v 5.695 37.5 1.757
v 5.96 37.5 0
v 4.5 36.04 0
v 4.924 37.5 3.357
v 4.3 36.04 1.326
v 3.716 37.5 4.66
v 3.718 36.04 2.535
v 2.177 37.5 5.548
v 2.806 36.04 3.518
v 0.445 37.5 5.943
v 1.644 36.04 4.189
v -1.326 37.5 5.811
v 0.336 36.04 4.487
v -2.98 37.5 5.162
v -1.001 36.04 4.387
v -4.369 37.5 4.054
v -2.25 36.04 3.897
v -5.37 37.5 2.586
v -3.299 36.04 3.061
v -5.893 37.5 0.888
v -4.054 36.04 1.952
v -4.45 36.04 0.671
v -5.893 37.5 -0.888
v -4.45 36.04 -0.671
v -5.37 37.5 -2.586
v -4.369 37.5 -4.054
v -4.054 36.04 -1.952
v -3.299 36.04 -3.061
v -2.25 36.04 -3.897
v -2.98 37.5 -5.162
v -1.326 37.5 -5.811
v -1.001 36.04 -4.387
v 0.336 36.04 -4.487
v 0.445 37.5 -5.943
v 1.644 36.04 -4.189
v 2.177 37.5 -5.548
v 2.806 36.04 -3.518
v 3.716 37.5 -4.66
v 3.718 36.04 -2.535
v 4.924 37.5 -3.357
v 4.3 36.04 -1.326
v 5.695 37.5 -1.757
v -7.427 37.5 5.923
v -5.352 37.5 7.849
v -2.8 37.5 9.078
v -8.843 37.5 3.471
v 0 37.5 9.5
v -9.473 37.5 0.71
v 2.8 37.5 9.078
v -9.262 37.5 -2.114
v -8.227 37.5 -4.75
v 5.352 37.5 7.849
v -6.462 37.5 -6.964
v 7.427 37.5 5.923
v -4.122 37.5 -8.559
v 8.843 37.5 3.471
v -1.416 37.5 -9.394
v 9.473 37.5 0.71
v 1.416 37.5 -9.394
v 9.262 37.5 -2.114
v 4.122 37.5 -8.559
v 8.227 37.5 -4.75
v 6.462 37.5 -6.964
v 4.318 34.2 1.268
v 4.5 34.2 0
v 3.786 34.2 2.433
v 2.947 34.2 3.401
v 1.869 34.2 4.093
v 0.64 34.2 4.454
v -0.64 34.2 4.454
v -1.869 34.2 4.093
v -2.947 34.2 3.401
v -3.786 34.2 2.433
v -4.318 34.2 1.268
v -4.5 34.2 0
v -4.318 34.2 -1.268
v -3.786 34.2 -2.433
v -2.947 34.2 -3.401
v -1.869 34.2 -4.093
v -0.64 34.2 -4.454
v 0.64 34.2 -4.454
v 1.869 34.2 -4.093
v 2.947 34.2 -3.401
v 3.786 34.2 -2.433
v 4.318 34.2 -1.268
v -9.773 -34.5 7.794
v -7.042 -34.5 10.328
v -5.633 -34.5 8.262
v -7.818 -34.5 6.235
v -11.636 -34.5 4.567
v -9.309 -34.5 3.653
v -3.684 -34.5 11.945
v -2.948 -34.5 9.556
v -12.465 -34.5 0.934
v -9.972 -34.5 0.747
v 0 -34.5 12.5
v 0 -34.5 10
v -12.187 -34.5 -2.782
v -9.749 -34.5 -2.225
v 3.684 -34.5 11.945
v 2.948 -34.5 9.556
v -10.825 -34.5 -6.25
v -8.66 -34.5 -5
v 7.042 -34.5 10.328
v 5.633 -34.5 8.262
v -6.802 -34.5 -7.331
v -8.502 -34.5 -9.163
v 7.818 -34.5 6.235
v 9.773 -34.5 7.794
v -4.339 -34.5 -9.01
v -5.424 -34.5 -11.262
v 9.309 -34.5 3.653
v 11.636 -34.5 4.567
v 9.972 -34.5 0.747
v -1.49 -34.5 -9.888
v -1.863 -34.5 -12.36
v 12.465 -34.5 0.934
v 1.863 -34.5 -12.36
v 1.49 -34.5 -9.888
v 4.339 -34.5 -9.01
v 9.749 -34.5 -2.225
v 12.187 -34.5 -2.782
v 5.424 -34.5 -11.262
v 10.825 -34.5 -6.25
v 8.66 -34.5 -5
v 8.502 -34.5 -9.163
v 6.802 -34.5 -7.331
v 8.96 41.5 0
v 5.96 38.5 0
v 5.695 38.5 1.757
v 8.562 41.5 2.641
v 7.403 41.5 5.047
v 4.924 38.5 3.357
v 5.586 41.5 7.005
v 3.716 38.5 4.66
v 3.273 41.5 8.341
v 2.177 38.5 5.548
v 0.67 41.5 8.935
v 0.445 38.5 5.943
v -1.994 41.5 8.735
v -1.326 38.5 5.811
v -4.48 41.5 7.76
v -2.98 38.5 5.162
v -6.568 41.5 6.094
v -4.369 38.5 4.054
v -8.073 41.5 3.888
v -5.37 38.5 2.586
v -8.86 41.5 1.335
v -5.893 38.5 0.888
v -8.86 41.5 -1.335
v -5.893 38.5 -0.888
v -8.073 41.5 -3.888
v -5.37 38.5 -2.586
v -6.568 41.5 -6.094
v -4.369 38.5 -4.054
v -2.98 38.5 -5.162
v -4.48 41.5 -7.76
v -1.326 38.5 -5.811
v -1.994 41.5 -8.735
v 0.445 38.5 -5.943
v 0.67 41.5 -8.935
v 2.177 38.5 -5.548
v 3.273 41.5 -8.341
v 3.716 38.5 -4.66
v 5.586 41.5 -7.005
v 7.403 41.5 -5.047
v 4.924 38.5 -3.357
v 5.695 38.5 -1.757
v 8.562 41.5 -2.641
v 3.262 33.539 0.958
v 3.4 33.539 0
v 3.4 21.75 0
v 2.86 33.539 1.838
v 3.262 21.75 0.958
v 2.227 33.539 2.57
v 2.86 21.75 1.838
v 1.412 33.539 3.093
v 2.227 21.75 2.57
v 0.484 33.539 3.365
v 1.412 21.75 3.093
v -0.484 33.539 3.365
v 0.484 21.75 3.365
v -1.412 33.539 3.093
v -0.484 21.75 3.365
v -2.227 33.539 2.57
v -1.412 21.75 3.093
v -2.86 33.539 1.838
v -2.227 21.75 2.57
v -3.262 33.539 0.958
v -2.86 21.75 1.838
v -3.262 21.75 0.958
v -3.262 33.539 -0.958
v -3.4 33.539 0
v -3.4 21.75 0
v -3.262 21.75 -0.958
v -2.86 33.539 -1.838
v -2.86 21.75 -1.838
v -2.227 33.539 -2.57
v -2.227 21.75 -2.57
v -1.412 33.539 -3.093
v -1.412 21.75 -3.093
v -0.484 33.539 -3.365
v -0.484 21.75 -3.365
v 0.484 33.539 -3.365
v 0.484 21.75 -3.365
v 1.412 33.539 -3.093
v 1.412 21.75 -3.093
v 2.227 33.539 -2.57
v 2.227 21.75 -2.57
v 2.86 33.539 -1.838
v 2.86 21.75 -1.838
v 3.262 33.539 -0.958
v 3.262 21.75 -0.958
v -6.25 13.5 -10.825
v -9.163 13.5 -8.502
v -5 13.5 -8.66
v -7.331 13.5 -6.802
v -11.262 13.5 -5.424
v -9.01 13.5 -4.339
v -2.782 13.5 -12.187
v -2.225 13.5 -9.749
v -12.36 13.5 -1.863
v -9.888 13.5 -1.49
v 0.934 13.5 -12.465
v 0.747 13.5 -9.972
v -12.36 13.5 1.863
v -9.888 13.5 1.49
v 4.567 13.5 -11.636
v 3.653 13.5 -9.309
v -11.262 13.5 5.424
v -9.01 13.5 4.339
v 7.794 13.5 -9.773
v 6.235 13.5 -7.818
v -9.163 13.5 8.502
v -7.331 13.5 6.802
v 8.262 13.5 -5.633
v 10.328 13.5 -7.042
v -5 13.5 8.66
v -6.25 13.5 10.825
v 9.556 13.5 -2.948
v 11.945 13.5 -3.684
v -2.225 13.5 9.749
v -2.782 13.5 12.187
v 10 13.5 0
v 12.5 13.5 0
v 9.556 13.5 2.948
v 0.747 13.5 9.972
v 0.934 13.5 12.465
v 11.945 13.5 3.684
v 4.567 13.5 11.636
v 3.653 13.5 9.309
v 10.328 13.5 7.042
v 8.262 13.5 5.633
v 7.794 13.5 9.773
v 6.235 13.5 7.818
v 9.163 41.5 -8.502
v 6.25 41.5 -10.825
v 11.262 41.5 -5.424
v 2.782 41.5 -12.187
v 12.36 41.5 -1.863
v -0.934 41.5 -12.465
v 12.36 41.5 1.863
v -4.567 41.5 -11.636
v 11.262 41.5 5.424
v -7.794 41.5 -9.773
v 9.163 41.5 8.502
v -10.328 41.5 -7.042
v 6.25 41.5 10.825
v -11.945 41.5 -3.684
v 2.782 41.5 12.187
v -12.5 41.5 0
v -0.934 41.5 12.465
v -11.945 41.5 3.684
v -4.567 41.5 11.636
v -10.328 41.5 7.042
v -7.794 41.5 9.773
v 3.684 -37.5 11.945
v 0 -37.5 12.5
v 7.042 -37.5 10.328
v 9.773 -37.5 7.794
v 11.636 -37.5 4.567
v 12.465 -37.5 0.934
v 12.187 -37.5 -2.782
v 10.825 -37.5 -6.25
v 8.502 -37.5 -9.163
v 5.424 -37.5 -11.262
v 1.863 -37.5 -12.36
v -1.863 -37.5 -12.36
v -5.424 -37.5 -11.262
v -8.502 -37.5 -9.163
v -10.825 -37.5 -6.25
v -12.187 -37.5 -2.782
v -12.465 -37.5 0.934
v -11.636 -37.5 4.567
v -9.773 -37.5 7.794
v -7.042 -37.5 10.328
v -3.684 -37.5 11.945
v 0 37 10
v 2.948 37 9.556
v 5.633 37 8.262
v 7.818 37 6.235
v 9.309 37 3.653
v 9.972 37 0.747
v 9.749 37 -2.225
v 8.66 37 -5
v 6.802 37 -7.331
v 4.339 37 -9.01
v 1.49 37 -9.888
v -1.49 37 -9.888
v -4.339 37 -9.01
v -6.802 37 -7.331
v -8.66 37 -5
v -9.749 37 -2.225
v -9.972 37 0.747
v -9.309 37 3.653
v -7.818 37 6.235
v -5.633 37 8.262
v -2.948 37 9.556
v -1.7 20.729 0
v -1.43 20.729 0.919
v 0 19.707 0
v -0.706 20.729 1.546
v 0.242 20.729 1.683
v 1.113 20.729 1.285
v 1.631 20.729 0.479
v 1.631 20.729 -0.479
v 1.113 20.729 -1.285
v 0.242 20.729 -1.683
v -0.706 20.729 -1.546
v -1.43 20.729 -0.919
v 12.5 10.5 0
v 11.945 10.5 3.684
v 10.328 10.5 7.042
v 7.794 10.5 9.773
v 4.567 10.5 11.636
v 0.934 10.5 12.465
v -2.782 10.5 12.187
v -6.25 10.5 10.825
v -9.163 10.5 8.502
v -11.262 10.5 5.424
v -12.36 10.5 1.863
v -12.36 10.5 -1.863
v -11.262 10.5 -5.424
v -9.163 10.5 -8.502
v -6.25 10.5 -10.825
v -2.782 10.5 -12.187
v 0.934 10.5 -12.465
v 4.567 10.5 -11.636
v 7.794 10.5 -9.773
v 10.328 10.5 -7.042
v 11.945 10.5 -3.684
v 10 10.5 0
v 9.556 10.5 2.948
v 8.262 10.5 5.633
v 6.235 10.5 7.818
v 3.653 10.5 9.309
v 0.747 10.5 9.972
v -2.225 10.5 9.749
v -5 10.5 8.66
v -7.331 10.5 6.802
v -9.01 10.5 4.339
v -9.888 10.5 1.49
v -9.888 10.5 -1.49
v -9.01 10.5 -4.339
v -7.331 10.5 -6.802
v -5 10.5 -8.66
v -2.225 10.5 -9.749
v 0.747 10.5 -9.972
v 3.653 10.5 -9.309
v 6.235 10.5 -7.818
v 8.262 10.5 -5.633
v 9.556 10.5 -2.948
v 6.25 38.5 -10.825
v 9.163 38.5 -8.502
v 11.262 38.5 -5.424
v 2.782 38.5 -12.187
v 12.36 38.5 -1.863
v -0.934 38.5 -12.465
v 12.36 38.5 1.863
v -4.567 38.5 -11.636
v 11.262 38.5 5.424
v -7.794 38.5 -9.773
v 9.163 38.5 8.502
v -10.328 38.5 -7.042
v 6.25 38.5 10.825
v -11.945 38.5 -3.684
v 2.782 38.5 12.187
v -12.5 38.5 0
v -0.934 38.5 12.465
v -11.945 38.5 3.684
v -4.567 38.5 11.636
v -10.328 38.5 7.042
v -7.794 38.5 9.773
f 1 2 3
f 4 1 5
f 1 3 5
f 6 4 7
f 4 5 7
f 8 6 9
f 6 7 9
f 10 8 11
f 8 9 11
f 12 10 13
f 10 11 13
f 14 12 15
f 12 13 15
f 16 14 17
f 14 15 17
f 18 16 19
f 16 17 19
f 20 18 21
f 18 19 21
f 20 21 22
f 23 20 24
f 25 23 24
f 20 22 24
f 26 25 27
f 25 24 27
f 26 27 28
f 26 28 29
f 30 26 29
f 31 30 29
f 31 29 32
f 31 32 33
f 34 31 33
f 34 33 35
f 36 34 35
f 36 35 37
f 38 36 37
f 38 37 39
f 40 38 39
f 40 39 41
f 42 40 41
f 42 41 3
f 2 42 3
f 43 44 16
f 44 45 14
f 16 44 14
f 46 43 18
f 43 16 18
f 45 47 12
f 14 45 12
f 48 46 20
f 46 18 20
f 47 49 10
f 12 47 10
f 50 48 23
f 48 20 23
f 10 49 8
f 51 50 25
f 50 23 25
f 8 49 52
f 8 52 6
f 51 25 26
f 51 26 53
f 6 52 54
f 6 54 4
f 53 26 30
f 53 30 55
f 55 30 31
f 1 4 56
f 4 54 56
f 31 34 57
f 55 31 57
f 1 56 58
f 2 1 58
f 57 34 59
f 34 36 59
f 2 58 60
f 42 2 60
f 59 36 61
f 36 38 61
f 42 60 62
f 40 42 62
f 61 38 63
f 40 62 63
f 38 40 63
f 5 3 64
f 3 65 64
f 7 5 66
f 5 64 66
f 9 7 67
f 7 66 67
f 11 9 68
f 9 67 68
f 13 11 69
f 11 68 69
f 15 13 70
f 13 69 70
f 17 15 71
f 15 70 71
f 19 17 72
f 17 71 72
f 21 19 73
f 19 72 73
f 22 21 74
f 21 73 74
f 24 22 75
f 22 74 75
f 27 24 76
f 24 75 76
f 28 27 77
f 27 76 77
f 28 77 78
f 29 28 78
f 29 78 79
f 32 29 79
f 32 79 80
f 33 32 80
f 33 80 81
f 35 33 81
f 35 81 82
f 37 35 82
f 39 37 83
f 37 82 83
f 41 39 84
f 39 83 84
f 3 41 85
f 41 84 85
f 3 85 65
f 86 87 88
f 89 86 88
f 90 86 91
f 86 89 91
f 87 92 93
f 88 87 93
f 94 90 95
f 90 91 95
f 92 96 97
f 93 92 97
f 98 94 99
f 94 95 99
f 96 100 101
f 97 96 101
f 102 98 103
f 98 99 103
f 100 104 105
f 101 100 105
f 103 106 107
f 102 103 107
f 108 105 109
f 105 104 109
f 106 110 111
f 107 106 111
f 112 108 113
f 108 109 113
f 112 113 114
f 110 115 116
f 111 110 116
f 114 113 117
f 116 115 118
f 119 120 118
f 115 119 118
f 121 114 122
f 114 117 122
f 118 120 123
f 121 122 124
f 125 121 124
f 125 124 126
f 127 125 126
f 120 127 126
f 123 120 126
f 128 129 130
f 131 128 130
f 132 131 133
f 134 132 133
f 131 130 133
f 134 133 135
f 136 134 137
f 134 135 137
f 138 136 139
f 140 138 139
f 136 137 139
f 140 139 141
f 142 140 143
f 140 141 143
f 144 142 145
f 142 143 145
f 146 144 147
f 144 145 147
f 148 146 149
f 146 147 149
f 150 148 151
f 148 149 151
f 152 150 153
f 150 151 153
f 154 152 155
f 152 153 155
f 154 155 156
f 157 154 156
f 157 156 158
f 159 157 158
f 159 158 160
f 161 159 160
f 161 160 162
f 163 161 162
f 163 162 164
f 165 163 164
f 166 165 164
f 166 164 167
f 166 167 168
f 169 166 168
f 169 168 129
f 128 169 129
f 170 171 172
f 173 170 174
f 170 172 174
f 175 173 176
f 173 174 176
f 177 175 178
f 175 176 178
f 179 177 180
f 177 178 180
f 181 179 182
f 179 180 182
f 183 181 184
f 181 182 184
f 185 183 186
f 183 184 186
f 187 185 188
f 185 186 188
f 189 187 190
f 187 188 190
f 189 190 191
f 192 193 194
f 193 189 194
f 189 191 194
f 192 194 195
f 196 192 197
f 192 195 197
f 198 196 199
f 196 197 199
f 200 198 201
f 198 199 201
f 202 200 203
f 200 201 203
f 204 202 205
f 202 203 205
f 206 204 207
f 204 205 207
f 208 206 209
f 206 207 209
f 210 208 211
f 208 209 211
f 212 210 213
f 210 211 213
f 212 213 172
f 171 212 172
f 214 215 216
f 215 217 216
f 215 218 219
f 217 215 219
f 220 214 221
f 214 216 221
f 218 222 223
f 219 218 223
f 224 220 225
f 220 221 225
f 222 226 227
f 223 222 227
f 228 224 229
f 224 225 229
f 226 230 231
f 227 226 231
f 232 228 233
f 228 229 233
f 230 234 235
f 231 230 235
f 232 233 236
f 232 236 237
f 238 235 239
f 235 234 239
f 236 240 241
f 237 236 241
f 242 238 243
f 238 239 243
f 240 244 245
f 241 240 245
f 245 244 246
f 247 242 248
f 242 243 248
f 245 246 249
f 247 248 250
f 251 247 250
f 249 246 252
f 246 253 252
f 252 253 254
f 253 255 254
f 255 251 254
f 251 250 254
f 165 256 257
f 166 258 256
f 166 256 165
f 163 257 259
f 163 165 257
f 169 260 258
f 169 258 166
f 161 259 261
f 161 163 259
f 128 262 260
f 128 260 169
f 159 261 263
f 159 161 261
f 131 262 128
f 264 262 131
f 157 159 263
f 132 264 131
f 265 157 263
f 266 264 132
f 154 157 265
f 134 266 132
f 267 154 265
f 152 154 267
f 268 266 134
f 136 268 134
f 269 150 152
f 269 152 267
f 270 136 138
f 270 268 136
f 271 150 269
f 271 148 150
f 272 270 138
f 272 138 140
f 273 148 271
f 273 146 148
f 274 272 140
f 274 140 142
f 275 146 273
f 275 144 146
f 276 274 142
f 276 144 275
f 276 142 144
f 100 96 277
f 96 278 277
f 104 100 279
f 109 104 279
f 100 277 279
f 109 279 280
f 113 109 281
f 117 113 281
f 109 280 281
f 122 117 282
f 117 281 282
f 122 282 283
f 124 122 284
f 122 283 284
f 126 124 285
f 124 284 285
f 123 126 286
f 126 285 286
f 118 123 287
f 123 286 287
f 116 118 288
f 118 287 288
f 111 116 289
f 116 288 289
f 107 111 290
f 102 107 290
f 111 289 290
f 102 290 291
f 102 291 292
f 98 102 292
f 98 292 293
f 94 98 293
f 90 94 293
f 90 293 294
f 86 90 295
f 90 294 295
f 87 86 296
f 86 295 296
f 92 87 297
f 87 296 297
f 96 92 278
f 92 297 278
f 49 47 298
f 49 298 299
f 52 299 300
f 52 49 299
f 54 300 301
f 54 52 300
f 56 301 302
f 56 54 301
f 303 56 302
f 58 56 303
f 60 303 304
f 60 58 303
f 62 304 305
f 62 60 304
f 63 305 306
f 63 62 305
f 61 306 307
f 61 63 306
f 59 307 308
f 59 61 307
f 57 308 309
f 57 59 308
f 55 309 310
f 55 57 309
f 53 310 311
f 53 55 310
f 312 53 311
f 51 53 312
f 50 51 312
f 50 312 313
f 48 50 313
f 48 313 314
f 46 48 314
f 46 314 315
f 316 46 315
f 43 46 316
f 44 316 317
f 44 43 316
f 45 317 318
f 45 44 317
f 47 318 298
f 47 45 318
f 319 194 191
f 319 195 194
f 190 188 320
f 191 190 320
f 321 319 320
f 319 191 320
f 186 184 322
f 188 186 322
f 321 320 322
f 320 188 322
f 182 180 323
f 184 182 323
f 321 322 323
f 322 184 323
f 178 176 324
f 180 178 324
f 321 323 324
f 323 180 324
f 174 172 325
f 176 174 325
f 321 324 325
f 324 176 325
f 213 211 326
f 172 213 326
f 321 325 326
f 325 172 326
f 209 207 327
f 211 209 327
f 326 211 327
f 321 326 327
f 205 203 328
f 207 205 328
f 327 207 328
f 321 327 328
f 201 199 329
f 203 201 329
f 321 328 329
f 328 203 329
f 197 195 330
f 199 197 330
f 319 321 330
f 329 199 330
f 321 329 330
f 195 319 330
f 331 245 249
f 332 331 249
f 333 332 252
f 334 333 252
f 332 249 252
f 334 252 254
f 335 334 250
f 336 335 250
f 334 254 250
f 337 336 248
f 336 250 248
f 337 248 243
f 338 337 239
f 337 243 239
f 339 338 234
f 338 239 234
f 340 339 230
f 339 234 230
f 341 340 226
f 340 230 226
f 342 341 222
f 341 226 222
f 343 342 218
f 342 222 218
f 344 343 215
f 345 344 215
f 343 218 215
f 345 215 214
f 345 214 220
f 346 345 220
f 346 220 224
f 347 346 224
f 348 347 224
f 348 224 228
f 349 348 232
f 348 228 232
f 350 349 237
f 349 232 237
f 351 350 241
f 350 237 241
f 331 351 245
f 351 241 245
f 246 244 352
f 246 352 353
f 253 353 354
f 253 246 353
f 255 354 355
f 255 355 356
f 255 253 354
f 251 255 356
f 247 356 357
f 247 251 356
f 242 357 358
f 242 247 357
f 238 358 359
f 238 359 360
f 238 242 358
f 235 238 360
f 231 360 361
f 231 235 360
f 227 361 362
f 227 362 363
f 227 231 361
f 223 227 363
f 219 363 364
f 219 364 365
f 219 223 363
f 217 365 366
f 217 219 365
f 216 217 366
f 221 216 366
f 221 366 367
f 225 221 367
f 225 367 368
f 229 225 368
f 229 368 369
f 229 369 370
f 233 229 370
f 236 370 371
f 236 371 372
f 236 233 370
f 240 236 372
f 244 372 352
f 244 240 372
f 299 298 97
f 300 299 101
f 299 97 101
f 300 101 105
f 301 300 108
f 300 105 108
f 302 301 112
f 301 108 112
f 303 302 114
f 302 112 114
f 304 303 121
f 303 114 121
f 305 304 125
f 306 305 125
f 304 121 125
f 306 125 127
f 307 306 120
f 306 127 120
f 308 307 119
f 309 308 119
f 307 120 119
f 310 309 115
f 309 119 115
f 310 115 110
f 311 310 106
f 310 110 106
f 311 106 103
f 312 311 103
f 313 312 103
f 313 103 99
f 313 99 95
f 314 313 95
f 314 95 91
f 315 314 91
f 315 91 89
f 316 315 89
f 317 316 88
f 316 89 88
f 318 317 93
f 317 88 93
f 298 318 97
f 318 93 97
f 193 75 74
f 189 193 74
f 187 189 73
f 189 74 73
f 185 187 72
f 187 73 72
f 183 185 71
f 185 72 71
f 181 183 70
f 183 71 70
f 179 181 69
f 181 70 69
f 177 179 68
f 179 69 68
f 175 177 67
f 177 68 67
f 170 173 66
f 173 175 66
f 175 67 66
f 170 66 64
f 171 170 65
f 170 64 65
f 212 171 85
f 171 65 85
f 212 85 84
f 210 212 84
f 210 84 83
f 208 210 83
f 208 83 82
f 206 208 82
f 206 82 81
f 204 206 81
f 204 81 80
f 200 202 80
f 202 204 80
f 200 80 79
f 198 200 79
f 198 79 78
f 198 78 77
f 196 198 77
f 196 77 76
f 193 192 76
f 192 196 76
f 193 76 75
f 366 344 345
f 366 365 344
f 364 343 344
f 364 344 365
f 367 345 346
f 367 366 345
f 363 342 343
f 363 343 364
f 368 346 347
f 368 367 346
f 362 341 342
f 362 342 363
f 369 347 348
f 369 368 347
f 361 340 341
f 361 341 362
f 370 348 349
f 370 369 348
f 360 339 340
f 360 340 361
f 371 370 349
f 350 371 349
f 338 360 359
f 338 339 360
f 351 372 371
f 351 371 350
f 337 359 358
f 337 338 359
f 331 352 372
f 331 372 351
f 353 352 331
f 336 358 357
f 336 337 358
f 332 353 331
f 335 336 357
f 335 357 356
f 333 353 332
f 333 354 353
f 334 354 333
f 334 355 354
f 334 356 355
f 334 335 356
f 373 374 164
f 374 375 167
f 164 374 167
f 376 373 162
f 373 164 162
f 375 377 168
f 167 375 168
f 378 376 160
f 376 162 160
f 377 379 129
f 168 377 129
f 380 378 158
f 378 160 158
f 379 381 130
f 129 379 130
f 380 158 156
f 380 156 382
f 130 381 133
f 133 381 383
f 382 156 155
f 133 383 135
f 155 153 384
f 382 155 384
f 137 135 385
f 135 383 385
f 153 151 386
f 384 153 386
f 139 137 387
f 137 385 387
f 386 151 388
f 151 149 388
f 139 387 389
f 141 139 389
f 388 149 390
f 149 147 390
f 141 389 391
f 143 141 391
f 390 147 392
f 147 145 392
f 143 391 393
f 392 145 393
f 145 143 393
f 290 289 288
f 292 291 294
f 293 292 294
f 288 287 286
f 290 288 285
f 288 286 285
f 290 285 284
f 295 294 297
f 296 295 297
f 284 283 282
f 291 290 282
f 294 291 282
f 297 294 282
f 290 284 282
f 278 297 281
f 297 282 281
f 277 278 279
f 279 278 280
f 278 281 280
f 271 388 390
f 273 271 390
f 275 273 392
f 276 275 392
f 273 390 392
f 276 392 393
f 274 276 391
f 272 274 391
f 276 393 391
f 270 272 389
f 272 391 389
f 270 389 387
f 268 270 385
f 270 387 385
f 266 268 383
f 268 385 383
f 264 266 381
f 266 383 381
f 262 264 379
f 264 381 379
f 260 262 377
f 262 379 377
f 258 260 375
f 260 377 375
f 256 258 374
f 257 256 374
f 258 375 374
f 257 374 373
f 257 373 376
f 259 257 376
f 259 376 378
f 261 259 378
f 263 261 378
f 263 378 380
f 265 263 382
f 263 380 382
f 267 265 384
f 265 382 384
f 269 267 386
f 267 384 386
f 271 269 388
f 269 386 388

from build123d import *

# Parameters (mm, degrees)
F4_D            = 9
F4_DEPTH        = 6.3
F4_CSINK_D      = 17.92
F4_CSINK_ANGLE  = 90
F4_TIP          = 2.7038727856
F6_D            = 6.8
F6_DEPTH        = 15.75
F6_TIP          = 2.0429261047
F8_R            = 12.5
F9_DEPTH        = 3
F11_D           = 6.8
F11_DEPTH       = 15.75
F11_CSINK_D     = 17.92
F11_CSINK_ANGLE = 90
F11_TIP         = 2.0429261047
F12_SIZE        = 0.5
F14_R           = 12.5
F14_R_2         = 10
F15_DEPTH       = 3


with BuildPart() as f1:
    # F0 (on Right) → F1 (revolve)
    with BuildSketch(Plane.YZ):
        Polygon((-37.5, 12.5), (-37.5, 0), (37.5, 0), (37.5, 10), (-34.5, 10), (-34.5, 12.5), align=None)
    revolve(axis=Axis((0, 0, 0), (0, 1, 0)))

    # F4
    with Locations(Plane(origin=(0, 40.5, 0), x_dir=(-1, 0, 0), z_dir=(0, 1, 0))):
        with Locations((0, 0)):
            CounterSinkHole(F4_D / 2, F4_CSINK_D / 2, depth=F4_DEPTH, counter_sink_angle=F4_CSINK_ANGLE)
            with Locations((0, 0, -(F4_DEPTH + F4_TIP / 2))):  # 118° drill point
                Cone(0, F4_D / 2, F4_TIP, mode=Mode.SUBTRACT)

    # F6
    with Locations(Plane(origin=(0, 37.5, 0), x_dir=(-1, 0, 0), z_dir=(0, 1, 0))):
        with Locations((0, 0)):
            Hole(F6_D / 2, depth=F6_DEPTH)
            with Locations((0, 0, -(F6_DEPTH + F6_TIP / 2))):  # 118° drill point
                Cone(0, F6_D / 2, F6_TIP, mode=Mode.SUBTRACT)

    # F12
    f12_edges = [f1.edges().sort_by_distance(p)[0] for p in [
        (0, 37.5, -10),
    ]]
    chamfer(f12_edges, length=F12_SIZE)


with BuildPart() as f9:
    # F8 (on offset) → F9 (new body)
    with BuildSketch(Plane(origin=(0, 38.5, 0), x_dir=(-1, 0, 0), z_dir=(0, 1, 0))):
        Circle(F8_R)
    extrude(amount=F9_DEPTH)

    # F11
    with Locations(Plane(origin=(0, 41.5, 0), x_dir=(-1, 0, 0), z_dir=(0, 1, 0))):
        with Locations((0, 0)):
            CounterSinkHole(F11_D / 2, F11_CSINK_D / 2, depth=F11_DEPTH, counter_sink_angle=F11_CSINK_ANGLE)
            with Locations((0, 0, -(F11_DEPTH + F11_TIP / 2))):  # 118° drill point
                Cone(0, F11_D / 2, F11_TIP, mode=Mode.SUBTRACT)


with BuildPart() as f15:
    # F14 (on offset) → F15 (new body)
    with BuildSketch(Plane.XZ.offset(-13.5)):
        Circle(F14_R)
        Circle(F14_R_2, mode=Mode.SUBTRACT)
    extrude(amount=F15_DEPTH)


solid = Compound([f1.part, f9.part, f15.part])
